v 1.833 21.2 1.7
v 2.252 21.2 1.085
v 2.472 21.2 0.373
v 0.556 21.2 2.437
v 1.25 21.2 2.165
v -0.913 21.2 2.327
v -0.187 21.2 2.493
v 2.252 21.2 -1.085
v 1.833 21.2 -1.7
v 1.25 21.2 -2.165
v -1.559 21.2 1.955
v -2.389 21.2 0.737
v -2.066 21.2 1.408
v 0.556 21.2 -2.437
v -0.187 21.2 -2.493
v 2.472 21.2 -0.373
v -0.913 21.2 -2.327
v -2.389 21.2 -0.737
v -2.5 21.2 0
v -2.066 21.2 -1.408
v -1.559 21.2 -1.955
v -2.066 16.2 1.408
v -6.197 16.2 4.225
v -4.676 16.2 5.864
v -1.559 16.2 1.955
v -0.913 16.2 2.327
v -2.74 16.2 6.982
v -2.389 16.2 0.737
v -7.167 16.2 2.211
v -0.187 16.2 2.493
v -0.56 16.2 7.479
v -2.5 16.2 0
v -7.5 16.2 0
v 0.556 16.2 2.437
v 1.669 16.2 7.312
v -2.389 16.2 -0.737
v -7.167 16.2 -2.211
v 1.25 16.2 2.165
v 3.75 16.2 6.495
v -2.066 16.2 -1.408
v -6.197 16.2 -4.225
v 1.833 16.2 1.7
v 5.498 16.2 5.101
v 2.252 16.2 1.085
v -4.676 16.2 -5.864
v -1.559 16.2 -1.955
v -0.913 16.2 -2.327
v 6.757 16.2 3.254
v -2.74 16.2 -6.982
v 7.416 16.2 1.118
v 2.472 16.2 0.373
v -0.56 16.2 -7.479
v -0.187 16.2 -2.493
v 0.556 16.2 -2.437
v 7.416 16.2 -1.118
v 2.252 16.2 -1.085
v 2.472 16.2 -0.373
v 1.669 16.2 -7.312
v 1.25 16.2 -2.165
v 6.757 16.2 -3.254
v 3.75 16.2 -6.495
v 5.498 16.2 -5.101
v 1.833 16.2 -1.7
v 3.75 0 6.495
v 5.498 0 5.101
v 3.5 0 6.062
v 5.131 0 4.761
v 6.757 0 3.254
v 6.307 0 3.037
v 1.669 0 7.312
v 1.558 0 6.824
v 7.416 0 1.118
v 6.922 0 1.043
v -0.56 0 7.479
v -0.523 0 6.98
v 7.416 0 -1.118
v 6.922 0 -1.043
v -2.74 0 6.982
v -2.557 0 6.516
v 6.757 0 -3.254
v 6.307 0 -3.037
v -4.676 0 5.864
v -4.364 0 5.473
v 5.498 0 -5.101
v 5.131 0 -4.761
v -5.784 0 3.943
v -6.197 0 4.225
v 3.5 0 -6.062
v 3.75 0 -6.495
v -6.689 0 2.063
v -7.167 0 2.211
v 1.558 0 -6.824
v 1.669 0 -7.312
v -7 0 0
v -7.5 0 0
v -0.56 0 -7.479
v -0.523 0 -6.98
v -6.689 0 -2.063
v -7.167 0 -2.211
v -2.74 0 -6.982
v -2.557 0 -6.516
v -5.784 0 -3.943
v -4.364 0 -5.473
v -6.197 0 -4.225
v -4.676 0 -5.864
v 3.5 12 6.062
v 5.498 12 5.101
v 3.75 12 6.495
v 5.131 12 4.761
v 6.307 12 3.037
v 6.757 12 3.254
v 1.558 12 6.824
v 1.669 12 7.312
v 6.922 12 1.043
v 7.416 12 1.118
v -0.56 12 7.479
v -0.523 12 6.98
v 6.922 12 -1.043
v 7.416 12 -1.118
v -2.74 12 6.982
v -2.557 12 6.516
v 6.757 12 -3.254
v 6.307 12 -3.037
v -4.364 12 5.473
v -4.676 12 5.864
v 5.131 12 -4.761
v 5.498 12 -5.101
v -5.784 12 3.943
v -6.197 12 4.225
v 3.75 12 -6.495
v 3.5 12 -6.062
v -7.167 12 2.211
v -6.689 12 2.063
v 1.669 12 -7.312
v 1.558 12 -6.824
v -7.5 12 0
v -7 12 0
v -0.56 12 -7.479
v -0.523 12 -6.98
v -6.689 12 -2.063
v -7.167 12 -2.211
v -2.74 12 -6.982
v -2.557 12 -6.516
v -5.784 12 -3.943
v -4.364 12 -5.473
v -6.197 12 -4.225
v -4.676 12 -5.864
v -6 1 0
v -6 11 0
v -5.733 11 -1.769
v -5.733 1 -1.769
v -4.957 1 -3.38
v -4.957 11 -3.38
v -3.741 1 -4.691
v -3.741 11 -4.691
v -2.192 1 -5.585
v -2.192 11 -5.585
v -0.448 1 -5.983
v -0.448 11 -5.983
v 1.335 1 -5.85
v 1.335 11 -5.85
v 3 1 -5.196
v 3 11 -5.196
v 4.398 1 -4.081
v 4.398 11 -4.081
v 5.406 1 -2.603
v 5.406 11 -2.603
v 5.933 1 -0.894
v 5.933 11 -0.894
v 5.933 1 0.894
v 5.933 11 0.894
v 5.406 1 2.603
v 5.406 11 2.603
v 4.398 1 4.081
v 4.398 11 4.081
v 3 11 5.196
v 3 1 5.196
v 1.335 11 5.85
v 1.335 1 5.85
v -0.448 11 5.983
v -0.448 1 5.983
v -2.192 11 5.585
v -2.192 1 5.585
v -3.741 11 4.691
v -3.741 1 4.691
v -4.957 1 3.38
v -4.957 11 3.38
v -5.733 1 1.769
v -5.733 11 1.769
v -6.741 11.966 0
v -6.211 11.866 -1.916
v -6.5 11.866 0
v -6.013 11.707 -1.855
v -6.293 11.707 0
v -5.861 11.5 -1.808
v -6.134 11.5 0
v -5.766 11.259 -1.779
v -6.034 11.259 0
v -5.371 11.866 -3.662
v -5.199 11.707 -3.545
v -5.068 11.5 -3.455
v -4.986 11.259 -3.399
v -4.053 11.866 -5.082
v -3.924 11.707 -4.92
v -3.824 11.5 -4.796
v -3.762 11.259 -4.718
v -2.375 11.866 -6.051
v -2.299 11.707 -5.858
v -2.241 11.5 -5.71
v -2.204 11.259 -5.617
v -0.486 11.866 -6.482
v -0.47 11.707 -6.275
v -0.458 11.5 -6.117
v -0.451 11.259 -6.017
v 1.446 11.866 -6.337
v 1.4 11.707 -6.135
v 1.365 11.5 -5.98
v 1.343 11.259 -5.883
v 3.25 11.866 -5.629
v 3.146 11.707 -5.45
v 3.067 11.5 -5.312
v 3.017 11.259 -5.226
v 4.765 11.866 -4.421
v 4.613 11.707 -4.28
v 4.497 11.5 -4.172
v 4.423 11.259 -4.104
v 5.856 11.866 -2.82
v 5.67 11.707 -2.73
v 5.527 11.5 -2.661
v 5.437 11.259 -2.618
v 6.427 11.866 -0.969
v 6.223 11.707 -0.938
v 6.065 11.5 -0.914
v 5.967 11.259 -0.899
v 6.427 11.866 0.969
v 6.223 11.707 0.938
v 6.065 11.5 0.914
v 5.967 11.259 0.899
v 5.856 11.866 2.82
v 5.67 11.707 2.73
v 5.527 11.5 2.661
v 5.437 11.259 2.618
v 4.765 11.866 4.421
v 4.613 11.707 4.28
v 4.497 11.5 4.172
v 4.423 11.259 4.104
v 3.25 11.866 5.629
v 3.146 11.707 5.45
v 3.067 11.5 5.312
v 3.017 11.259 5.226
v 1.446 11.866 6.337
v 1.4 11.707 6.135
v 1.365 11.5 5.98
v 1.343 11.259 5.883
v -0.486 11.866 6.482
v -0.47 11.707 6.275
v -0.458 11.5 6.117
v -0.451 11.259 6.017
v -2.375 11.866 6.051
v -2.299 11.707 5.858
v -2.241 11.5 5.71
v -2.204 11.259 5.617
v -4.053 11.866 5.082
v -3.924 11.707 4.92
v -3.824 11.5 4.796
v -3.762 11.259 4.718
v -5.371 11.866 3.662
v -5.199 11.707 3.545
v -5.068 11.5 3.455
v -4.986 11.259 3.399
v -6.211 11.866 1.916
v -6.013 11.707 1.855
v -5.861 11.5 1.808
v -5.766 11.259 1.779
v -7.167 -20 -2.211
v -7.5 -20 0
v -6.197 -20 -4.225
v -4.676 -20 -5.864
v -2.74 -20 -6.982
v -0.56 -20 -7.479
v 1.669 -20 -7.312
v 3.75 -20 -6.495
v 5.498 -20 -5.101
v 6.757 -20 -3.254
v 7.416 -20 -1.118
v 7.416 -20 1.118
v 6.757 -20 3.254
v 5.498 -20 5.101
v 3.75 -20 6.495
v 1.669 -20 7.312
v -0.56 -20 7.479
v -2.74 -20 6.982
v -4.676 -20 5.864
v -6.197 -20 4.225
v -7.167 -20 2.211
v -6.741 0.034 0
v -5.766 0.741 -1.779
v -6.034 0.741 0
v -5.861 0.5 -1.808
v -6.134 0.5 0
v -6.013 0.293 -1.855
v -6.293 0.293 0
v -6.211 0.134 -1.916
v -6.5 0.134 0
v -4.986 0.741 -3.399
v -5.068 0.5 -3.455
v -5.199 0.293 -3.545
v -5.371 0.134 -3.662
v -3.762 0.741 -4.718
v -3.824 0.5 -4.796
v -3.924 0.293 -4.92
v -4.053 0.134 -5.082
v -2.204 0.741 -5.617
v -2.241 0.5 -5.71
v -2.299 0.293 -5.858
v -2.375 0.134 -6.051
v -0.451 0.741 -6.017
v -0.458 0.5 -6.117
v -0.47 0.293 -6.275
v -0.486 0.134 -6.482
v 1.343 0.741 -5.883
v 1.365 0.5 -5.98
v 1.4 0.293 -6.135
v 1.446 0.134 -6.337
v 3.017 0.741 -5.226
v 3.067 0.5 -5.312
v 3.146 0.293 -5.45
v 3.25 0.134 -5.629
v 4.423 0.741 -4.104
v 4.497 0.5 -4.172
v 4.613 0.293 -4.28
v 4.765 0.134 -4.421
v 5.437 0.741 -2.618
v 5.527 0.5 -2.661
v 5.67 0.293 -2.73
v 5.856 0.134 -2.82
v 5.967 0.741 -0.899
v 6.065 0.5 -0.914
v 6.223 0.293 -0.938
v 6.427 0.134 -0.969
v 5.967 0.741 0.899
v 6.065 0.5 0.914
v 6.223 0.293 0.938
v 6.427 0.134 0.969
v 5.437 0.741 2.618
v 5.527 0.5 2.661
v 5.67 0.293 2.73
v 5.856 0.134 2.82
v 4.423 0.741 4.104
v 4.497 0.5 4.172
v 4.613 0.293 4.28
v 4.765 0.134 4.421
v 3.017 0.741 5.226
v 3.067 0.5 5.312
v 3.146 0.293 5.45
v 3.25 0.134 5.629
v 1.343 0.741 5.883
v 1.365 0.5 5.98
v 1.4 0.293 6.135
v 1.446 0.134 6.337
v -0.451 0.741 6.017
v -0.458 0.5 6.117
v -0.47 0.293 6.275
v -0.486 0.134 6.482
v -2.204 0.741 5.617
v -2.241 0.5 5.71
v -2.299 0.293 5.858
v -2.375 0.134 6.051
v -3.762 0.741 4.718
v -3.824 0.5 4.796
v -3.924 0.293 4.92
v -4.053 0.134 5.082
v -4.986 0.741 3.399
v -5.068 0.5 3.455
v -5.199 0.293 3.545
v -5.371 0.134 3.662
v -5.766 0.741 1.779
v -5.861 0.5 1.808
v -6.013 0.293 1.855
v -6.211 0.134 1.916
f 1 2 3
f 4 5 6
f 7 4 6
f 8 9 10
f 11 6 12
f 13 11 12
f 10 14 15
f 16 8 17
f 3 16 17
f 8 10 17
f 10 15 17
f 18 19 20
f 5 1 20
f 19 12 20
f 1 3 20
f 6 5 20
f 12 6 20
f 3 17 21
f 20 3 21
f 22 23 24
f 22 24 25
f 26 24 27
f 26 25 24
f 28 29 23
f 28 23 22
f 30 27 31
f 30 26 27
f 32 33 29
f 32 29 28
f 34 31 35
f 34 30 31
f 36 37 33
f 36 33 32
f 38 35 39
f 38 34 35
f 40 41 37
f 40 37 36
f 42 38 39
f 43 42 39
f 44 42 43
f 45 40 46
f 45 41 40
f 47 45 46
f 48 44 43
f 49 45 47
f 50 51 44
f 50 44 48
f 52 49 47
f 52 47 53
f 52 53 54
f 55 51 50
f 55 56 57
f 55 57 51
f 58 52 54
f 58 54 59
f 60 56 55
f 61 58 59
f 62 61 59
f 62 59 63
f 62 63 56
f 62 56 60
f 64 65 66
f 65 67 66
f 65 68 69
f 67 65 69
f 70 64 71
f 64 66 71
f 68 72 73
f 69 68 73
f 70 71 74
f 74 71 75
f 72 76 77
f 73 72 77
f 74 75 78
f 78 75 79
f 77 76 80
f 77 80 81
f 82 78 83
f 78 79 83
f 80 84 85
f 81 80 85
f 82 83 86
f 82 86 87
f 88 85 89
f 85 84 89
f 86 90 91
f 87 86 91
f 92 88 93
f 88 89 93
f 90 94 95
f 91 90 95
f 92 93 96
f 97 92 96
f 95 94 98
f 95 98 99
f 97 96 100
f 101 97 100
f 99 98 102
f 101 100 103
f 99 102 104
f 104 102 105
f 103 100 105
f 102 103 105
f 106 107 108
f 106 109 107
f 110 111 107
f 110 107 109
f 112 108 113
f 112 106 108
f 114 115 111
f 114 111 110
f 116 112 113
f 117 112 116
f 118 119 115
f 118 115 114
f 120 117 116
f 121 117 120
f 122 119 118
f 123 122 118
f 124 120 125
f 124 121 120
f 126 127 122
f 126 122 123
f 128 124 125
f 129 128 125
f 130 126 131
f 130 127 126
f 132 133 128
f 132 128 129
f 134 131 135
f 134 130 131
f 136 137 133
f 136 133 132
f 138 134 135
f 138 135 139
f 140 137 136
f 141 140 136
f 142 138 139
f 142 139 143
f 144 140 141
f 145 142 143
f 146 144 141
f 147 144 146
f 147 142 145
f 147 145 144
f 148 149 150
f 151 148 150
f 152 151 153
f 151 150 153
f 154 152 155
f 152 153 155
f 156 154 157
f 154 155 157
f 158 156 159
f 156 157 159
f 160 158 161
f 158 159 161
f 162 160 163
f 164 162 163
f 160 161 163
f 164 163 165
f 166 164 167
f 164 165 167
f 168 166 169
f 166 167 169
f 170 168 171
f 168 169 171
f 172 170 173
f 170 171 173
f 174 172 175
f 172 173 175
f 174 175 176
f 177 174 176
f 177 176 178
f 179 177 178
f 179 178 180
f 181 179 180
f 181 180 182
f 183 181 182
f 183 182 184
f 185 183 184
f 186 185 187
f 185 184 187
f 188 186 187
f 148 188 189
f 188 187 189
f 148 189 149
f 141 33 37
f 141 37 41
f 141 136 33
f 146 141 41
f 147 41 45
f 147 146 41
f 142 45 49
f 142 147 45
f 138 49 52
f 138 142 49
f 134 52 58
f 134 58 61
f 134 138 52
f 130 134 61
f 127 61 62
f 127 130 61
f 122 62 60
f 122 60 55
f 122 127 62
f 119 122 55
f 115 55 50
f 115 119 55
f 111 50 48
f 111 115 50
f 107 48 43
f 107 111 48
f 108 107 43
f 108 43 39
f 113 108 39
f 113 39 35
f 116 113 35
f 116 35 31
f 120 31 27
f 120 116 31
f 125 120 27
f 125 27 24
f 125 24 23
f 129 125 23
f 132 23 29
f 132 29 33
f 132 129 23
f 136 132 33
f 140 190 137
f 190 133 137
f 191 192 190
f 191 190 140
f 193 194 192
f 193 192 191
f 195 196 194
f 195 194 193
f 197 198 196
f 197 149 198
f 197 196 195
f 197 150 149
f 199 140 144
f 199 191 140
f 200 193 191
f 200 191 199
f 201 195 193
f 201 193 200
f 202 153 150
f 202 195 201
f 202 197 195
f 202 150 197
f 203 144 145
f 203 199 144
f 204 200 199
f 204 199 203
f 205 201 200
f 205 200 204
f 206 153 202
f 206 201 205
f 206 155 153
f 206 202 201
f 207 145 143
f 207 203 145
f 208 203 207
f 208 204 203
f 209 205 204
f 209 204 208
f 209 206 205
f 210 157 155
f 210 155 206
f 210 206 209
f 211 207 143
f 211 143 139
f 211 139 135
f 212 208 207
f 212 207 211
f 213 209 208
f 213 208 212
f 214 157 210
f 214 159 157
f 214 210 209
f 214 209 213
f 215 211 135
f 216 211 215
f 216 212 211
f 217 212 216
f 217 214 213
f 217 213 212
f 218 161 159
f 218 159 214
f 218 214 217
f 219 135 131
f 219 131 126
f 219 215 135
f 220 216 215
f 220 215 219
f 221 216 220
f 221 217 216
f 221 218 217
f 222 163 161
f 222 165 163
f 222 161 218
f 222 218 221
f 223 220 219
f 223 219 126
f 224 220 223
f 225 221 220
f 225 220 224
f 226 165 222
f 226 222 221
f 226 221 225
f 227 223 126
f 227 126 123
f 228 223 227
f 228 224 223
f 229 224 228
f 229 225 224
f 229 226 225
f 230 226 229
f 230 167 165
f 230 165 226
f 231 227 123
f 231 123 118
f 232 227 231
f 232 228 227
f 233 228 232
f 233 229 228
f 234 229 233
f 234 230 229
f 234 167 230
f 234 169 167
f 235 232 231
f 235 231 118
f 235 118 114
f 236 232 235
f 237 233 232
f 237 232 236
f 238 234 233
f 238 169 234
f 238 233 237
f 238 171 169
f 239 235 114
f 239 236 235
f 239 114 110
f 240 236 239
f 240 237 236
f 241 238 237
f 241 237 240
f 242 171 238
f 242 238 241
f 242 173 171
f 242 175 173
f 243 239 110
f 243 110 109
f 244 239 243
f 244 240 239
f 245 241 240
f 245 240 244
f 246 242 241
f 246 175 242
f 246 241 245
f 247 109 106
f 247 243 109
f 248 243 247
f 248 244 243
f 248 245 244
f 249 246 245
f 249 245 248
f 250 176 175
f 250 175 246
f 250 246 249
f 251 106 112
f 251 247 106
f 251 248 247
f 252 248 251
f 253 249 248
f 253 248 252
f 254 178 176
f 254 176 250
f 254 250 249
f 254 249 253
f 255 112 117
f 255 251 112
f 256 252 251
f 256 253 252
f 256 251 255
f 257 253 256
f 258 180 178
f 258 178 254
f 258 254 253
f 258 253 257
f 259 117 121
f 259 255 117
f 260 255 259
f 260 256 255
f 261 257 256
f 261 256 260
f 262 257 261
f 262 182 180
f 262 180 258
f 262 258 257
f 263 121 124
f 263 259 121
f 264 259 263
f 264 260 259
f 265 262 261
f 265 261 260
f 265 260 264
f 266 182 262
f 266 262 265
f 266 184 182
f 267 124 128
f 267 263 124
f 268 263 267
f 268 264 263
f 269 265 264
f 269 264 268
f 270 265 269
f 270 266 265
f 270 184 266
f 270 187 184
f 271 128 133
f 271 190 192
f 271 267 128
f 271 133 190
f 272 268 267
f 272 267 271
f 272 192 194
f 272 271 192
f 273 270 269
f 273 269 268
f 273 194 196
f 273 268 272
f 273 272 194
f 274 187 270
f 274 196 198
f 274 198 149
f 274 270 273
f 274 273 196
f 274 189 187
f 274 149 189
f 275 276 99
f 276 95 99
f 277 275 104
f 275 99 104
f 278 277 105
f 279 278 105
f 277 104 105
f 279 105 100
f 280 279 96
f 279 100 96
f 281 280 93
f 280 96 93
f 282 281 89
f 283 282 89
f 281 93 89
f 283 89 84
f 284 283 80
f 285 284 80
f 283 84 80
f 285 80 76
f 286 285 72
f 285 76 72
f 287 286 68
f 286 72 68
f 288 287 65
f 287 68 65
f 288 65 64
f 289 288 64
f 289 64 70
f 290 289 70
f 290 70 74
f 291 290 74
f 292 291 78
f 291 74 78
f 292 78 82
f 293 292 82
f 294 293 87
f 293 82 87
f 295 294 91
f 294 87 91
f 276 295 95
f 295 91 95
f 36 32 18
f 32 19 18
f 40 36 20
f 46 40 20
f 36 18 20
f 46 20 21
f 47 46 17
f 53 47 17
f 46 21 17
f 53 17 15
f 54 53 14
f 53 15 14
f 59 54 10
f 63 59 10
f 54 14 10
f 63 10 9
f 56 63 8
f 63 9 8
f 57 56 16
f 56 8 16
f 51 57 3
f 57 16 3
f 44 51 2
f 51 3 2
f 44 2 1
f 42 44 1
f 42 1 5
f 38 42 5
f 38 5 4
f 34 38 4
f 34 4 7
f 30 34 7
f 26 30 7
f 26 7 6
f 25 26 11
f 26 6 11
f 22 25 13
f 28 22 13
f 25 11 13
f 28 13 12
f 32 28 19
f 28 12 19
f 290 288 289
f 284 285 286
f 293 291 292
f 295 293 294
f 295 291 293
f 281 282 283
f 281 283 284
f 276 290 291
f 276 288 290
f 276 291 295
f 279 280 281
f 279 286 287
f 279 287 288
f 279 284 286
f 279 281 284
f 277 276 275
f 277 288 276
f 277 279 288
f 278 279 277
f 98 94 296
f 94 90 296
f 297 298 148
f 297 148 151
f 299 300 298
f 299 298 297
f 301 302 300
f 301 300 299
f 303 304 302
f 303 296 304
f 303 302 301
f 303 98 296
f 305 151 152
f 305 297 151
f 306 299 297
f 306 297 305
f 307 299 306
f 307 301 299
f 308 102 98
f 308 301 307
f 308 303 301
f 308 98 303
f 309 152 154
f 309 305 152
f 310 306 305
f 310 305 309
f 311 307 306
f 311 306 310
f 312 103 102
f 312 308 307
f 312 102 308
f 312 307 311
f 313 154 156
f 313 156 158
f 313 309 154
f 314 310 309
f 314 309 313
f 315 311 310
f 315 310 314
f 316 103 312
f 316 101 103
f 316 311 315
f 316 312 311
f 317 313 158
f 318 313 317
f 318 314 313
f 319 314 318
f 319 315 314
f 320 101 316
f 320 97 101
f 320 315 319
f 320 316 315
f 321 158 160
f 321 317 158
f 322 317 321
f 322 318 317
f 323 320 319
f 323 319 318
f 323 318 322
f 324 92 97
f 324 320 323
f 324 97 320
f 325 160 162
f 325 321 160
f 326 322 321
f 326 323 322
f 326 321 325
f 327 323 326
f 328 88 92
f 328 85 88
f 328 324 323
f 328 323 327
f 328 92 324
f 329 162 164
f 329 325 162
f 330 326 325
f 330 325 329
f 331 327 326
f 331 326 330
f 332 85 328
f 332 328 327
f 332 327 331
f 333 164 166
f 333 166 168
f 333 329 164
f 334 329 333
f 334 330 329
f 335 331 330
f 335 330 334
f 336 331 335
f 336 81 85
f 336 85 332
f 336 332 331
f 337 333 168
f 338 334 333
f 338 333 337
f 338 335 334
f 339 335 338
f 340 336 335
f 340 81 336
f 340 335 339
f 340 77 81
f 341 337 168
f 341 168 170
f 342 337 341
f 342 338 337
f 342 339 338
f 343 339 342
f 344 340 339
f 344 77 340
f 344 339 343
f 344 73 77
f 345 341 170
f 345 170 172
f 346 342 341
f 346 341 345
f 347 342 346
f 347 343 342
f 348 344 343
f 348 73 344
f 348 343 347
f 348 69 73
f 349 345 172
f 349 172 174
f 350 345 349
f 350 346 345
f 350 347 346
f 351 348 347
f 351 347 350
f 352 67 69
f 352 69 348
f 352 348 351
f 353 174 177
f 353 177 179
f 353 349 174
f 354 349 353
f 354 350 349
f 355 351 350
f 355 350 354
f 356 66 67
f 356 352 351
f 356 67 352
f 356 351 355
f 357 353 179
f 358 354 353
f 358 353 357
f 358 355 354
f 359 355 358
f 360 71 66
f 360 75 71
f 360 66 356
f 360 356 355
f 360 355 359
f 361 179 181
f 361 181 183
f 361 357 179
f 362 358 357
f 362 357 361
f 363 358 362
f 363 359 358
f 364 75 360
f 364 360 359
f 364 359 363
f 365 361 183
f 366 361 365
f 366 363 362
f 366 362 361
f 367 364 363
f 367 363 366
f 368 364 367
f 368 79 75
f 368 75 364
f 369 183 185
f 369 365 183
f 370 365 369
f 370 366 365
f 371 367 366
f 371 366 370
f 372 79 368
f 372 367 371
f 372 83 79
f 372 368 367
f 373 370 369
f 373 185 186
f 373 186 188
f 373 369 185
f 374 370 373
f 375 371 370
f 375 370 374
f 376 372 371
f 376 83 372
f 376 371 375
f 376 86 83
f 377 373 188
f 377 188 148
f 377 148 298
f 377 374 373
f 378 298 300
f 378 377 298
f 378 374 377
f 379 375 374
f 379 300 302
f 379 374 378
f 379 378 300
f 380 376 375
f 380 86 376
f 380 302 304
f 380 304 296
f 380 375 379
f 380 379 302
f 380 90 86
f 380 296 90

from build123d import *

# Parameters (mm, degrees)
SKETCH1_W   = 7.5
SKETCH1_H   = 20
SKETCH1_W_2 = 6
SKETCH1_H_2 = 12
SKETCH1_W_3 = 2.5
SKETCH1_H_3 = 5
FILLET1_R   = 1


with BuildPart() as part:
    # Sketch1 → Revolve1 (revolve)
    with BuildSketch(Plane.XY):
        with Locations((-3.75, -10)):
            Rectangle(SKETCH1_W, SKETCH1_H)
        with Locations((-3, 6)):
            Rectangle(SKETCH1_W_2, SKETCH1_H_2)
        Polygon((-6, 12), (0, 12), (0, 16.2), (-2.5, 16.2), (-7.5, 16.2), (-7.5, 12), align=None)
        with Locations((-1.25, 18.7)):
            Rectangle(SKETCH1_W_3, SKETCH1_H_3)
    revolve(axis=Axis((0, 25.269315462, 0), (0, -1, 0)))

    # Fillet1
    fillet1_edges = [part.edges().sort_by_distance(p)[0] for p in [
        (6, 0, 0),
        (6, 12, 0),
    ]]
    fillet(fillet1_edges, radius=FILLET1_R)


solid = part.part
